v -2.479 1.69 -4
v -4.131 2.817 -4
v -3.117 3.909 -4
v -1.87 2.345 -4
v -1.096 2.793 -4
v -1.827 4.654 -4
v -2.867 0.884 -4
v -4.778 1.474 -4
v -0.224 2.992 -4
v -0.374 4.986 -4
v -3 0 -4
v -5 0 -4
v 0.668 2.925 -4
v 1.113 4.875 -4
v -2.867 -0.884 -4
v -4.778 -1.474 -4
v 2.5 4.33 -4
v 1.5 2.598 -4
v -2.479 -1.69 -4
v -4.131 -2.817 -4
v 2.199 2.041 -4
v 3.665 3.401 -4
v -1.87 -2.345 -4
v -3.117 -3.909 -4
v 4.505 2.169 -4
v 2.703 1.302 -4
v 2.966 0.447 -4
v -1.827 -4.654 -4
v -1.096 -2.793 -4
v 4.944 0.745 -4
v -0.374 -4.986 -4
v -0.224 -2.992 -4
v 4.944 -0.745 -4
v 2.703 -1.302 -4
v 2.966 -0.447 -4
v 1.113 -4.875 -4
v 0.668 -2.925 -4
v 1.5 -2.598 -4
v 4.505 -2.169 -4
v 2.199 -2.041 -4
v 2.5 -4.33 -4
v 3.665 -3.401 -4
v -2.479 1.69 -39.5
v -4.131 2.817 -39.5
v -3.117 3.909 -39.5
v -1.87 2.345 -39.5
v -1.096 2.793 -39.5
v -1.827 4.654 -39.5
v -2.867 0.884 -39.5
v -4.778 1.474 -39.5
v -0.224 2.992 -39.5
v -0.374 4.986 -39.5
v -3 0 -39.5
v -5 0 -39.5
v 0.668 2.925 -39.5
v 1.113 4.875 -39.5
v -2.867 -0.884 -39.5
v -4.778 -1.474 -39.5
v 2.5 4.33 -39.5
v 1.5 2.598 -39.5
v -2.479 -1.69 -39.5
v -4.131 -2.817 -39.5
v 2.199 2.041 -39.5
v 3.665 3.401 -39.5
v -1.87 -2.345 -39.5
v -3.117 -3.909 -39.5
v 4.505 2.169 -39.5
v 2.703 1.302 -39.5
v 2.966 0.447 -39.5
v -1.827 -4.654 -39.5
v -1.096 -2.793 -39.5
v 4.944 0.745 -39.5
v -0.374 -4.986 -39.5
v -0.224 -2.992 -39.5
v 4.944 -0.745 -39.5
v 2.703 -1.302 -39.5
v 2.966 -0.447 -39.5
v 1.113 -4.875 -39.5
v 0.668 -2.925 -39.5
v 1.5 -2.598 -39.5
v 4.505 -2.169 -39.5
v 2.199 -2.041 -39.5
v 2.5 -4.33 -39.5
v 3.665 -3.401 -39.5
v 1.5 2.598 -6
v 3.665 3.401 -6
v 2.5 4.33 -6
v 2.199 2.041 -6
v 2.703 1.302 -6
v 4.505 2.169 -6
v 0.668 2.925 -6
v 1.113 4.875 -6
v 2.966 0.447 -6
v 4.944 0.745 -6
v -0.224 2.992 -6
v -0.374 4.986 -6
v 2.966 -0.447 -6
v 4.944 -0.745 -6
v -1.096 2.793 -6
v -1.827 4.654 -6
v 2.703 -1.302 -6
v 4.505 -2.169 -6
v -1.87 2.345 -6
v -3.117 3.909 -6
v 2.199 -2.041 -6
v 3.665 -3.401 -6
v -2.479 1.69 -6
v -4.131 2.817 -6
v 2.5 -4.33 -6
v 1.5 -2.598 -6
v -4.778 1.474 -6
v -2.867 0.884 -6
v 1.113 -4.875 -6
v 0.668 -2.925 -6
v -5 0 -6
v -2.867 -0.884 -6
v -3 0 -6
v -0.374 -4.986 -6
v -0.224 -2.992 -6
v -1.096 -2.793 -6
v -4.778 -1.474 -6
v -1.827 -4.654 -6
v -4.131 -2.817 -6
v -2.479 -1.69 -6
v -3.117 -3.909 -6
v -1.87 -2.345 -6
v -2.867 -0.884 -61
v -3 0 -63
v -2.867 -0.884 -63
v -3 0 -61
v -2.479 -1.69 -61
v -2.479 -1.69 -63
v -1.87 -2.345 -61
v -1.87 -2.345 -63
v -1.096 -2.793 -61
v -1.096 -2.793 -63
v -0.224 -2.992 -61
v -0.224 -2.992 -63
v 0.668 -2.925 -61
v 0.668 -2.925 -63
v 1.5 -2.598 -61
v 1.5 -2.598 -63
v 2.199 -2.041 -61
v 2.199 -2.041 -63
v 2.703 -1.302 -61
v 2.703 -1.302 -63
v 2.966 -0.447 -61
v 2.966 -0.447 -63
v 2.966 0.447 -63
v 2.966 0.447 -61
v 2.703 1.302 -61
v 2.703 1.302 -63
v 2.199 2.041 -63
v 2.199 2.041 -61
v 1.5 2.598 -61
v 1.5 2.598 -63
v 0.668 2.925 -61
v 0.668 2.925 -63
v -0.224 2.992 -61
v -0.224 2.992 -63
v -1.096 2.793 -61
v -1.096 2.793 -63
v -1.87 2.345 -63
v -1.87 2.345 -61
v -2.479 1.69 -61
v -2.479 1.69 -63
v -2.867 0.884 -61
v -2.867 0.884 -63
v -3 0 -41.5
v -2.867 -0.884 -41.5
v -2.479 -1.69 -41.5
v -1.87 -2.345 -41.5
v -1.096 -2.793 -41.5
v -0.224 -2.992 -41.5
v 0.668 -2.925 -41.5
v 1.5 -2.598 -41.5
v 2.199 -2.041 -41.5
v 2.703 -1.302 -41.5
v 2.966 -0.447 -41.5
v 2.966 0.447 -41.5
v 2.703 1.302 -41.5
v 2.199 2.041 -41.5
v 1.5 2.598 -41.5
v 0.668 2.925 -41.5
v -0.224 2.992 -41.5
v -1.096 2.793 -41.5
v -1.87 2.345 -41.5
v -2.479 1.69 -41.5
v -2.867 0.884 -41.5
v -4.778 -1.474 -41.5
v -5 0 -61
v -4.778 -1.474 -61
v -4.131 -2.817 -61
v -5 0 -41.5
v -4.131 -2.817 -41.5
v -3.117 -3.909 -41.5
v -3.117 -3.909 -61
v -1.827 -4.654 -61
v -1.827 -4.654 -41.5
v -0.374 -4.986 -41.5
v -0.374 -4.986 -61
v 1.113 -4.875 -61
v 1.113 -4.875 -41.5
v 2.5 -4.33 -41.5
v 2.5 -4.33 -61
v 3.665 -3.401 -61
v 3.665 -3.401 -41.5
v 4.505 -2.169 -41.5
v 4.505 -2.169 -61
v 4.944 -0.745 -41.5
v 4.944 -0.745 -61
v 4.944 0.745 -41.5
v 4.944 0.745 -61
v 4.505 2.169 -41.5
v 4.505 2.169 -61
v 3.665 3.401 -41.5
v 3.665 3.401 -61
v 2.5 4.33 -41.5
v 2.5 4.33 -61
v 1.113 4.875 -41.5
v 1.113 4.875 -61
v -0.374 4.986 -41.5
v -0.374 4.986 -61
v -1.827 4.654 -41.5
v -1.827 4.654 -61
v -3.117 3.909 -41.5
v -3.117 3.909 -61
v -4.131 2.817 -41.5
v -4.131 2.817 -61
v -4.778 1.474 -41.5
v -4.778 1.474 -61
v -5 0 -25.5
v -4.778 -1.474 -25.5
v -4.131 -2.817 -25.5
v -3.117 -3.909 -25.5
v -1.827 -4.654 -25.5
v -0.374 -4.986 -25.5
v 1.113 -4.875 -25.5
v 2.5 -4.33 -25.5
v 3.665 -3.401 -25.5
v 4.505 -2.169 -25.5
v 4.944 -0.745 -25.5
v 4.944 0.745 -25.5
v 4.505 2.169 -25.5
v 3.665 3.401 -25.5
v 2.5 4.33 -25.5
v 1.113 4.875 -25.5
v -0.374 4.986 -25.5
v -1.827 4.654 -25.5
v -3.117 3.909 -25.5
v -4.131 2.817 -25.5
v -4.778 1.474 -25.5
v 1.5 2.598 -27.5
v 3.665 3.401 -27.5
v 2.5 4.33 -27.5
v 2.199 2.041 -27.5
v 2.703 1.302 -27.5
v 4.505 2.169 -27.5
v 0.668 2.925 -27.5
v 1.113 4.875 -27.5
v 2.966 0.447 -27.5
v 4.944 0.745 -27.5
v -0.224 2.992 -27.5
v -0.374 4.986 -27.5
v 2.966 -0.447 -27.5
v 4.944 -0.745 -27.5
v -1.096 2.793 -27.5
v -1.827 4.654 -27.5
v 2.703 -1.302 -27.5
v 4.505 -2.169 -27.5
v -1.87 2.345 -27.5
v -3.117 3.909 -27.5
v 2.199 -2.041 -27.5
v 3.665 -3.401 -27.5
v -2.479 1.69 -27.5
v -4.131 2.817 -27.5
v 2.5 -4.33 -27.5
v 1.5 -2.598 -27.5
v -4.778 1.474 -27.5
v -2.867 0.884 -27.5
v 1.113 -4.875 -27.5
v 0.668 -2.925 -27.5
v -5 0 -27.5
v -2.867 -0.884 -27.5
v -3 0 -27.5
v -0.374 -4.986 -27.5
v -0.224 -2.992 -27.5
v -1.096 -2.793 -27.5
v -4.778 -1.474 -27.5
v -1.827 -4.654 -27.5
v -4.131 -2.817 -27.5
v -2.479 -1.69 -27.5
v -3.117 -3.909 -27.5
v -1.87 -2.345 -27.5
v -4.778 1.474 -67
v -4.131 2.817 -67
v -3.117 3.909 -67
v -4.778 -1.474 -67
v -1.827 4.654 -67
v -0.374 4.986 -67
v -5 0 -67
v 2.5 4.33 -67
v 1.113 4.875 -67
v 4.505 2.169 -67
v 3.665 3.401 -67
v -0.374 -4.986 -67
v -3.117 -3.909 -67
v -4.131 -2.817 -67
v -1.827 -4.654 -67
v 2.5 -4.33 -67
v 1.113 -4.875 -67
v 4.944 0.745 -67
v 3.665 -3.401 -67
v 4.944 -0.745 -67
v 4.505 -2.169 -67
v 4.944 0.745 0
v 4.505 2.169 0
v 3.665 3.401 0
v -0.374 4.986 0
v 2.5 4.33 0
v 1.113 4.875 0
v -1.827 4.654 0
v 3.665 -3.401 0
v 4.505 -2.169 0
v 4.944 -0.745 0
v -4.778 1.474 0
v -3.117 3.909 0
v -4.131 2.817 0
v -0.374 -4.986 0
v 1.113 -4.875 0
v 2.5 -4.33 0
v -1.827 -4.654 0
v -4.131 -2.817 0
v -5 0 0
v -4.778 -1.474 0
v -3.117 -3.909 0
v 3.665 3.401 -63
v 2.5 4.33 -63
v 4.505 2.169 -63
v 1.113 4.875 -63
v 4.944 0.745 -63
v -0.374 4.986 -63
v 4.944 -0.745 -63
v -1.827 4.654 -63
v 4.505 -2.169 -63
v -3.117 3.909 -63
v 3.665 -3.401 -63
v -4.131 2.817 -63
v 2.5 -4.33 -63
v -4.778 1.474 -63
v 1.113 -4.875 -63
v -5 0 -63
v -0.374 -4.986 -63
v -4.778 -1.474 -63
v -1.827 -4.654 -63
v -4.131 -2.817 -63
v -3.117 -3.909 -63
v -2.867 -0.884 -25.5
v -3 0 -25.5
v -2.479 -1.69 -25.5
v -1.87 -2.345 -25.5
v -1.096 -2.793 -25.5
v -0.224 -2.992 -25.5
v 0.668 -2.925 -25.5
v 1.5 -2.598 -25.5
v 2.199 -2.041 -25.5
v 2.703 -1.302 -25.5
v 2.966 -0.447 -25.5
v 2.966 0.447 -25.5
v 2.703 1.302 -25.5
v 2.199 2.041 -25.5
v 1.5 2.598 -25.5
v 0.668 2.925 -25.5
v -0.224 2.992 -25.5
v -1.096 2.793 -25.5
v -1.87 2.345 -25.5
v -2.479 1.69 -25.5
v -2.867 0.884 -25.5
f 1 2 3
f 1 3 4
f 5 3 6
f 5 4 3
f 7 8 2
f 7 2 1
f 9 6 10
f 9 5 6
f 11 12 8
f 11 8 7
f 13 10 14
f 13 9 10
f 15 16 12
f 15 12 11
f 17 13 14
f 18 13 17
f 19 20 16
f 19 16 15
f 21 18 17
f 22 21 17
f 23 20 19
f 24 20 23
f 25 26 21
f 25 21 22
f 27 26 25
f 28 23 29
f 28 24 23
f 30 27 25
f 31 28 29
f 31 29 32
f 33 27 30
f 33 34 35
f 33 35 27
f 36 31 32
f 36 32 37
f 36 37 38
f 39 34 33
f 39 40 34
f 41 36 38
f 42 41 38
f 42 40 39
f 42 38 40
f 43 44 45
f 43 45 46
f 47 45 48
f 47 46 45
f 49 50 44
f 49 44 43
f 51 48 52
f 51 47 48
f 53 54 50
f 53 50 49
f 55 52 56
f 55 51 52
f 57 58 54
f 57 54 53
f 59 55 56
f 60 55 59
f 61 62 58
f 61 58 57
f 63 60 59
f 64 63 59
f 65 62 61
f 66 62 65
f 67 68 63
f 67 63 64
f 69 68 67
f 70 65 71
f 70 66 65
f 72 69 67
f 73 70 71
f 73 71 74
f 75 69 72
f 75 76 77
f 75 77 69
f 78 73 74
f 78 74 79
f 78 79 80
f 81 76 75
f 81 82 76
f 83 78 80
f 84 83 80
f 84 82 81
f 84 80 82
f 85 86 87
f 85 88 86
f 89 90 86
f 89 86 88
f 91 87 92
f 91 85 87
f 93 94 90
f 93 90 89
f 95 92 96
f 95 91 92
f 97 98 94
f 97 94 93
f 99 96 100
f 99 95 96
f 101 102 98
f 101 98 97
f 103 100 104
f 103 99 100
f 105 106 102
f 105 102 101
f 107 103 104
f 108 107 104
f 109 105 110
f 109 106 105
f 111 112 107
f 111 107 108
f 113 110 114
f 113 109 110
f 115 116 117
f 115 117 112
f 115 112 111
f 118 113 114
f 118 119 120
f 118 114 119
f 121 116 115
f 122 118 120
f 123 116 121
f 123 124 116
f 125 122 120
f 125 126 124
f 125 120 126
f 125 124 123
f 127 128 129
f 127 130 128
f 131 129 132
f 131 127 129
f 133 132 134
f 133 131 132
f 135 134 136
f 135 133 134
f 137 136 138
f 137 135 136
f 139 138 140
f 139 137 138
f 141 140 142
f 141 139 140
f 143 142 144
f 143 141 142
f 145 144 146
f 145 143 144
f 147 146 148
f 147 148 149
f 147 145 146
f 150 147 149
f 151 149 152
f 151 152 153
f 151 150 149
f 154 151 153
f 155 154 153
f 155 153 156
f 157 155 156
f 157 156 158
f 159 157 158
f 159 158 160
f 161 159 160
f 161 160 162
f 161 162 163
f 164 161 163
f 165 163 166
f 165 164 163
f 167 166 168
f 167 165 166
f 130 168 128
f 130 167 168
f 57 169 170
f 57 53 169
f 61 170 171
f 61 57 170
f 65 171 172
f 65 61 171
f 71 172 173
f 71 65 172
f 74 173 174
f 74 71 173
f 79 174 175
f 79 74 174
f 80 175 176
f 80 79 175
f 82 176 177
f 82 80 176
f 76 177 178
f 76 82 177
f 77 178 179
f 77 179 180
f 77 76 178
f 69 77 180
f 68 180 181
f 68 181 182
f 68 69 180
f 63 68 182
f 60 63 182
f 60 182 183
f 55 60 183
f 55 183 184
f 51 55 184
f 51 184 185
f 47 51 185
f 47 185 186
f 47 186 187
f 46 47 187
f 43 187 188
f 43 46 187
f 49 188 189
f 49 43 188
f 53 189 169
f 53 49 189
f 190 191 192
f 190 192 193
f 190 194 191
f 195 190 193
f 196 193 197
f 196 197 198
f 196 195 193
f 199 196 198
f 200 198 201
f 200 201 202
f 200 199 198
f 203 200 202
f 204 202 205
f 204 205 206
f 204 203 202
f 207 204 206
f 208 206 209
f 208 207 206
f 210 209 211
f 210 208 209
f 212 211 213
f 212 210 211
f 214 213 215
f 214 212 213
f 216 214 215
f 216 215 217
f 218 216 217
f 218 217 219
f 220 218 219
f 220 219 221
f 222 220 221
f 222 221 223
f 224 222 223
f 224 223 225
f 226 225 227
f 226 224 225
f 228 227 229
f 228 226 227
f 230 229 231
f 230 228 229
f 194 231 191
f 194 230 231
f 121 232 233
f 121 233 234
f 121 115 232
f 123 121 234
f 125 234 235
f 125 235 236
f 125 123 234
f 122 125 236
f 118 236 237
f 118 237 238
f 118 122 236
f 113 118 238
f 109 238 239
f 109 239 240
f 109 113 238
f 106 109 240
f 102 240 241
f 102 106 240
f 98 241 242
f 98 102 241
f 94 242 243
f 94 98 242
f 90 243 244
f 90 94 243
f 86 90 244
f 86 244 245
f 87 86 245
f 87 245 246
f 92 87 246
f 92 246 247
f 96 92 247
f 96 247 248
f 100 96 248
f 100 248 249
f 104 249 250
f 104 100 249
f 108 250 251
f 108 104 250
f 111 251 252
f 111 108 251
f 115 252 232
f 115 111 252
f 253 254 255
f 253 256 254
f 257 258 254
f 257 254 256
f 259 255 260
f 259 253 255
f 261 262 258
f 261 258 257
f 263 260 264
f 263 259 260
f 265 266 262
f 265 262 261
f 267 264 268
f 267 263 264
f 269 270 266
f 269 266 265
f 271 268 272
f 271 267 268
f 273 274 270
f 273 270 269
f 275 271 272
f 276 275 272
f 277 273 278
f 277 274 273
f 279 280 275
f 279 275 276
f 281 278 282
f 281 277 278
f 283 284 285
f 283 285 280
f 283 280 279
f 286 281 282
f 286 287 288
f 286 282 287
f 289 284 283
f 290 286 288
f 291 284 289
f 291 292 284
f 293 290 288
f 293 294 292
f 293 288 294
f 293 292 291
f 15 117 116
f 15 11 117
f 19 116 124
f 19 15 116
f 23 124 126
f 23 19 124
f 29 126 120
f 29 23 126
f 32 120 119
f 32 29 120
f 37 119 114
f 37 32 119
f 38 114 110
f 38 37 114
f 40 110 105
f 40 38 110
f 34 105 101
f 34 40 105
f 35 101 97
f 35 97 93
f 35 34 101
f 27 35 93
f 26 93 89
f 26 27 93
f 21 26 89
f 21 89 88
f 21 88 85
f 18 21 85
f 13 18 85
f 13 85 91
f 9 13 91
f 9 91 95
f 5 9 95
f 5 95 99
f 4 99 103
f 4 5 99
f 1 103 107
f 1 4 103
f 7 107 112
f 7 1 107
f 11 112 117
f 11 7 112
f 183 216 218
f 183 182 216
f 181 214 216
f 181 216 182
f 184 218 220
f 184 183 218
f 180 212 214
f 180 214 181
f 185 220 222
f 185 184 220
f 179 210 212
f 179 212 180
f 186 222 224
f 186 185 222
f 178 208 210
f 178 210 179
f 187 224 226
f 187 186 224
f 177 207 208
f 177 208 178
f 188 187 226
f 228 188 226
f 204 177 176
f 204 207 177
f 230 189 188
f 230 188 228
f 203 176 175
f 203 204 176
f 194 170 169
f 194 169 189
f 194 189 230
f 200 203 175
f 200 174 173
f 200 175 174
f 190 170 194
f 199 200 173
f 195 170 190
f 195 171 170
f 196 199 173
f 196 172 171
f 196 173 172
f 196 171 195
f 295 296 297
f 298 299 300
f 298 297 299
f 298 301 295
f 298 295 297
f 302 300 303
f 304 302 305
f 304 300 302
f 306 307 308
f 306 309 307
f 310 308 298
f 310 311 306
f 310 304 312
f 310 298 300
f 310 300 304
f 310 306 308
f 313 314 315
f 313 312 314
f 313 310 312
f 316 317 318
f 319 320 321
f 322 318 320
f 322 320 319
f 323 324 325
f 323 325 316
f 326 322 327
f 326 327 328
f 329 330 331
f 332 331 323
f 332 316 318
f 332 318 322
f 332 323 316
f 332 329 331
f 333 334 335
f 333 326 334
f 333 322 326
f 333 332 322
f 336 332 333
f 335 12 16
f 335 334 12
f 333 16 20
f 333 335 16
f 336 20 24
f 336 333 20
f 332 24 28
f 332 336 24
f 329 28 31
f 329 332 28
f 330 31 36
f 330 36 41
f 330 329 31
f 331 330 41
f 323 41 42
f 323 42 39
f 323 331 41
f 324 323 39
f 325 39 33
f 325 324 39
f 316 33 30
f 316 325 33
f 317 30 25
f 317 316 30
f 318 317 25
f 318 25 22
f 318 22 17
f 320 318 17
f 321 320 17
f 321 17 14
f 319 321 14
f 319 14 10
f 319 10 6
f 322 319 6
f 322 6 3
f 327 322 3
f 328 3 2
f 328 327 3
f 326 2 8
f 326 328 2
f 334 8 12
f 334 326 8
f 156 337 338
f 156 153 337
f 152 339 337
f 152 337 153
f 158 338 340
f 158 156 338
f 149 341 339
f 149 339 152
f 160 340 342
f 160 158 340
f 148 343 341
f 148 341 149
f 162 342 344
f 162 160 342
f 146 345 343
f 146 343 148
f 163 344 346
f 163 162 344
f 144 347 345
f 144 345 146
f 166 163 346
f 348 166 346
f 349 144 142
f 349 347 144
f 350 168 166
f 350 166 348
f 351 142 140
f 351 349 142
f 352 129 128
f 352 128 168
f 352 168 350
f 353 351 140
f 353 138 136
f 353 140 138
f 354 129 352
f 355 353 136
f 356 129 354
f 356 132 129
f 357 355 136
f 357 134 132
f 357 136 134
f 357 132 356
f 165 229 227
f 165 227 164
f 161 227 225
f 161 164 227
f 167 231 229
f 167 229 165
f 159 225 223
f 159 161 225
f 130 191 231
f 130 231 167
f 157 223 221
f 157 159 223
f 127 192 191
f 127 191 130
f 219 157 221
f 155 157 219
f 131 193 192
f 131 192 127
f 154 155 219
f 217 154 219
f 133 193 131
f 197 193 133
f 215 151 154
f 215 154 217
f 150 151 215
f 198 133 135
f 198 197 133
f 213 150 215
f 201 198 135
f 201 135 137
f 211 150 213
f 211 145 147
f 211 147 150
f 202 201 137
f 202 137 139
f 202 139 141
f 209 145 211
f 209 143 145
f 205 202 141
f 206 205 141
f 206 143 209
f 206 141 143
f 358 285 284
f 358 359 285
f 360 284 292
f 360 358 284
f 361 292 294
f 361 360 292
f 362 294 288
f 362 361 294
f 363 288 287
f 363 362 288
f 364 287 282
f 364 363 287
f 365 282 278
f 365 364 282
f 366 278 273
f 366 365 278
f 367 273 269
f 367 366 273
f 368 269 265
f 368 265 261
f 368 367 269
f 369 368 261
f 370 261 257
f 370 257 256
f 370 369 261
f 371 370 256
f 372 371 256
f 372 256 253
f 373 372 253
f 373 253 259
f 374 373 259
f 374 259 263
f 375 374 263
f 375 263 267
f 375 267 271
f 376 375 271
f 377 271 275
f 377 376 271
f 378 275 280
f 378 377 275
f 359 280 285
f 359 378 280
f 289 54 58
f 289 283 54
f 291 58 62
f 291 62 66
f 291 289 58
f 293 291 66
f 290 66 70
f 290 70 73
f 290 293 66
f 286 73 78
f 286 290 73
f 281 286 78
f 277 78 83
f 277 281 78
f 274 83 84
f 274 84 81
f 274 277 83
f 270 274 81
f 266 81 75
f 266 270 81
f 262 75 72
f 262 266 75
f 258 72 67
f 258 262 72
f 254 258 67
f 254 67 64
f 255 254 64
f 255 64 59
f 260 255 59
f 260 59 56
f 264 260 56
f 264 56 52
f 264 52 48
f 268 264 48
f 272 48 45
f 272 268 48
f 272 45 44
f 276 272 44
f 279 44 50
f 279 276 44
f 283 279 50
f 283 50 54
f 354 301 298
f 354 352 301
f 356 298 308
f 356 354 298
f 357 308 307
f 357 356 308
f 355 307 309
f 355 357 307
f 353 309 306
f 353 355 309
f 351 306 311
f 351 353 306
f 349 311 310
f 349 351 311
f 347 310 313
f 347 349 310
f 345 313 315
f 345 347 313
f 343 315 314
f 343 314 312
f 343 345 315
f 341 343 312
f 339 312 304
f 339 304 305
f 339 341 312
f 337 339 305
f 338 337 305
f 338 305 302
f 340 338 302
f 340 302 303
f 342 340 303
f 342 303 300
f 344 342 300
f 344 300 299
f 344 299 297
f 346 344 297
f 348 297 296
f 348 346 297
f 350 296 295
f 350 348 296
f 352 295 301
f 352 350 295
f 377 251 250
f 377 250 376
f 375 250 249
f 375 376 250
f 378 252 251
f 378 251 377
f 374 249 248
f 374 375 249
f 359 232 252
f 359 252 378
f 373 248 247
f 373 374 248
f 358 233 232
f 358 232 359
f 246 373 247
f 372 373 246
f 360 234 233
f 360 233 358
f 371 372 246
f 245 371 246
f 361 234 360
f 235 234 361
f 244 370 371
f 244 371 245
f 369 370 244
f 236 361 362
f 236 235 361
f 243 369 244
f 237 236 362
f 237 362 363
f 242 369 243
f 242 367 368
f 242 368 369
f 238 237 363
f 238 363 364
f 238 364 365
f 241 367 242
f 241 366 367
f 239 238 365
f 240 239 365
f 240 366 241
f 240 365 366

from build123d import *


with BuildPart() as part:
    # Sketch2 → Revolve1 (revolve)
    with BuildSketch(Plane(origin=(0, 0, 0), x_dir=(1, 0, 0), z_dir=(0, 1, 0))):
        Polygon((0, 0), (0, 67), (-5, 67), (-5, 63), (-3, 63), (-3, 61), (-5, 61), (-5, 41.5), (-3, 41.5), (-3, 39.5), (-5, 39.5), (-5, 27.5), (-3, 27.5), (-3, 25.5), (-5, 25.5), (-5, 6), (-3, 6), (-3, 4), (-5, 4), (-5, 0), align=None)
    revolve(axis=Axis((0, 0, -67), (0, 0, 1)))


solid = part.part
